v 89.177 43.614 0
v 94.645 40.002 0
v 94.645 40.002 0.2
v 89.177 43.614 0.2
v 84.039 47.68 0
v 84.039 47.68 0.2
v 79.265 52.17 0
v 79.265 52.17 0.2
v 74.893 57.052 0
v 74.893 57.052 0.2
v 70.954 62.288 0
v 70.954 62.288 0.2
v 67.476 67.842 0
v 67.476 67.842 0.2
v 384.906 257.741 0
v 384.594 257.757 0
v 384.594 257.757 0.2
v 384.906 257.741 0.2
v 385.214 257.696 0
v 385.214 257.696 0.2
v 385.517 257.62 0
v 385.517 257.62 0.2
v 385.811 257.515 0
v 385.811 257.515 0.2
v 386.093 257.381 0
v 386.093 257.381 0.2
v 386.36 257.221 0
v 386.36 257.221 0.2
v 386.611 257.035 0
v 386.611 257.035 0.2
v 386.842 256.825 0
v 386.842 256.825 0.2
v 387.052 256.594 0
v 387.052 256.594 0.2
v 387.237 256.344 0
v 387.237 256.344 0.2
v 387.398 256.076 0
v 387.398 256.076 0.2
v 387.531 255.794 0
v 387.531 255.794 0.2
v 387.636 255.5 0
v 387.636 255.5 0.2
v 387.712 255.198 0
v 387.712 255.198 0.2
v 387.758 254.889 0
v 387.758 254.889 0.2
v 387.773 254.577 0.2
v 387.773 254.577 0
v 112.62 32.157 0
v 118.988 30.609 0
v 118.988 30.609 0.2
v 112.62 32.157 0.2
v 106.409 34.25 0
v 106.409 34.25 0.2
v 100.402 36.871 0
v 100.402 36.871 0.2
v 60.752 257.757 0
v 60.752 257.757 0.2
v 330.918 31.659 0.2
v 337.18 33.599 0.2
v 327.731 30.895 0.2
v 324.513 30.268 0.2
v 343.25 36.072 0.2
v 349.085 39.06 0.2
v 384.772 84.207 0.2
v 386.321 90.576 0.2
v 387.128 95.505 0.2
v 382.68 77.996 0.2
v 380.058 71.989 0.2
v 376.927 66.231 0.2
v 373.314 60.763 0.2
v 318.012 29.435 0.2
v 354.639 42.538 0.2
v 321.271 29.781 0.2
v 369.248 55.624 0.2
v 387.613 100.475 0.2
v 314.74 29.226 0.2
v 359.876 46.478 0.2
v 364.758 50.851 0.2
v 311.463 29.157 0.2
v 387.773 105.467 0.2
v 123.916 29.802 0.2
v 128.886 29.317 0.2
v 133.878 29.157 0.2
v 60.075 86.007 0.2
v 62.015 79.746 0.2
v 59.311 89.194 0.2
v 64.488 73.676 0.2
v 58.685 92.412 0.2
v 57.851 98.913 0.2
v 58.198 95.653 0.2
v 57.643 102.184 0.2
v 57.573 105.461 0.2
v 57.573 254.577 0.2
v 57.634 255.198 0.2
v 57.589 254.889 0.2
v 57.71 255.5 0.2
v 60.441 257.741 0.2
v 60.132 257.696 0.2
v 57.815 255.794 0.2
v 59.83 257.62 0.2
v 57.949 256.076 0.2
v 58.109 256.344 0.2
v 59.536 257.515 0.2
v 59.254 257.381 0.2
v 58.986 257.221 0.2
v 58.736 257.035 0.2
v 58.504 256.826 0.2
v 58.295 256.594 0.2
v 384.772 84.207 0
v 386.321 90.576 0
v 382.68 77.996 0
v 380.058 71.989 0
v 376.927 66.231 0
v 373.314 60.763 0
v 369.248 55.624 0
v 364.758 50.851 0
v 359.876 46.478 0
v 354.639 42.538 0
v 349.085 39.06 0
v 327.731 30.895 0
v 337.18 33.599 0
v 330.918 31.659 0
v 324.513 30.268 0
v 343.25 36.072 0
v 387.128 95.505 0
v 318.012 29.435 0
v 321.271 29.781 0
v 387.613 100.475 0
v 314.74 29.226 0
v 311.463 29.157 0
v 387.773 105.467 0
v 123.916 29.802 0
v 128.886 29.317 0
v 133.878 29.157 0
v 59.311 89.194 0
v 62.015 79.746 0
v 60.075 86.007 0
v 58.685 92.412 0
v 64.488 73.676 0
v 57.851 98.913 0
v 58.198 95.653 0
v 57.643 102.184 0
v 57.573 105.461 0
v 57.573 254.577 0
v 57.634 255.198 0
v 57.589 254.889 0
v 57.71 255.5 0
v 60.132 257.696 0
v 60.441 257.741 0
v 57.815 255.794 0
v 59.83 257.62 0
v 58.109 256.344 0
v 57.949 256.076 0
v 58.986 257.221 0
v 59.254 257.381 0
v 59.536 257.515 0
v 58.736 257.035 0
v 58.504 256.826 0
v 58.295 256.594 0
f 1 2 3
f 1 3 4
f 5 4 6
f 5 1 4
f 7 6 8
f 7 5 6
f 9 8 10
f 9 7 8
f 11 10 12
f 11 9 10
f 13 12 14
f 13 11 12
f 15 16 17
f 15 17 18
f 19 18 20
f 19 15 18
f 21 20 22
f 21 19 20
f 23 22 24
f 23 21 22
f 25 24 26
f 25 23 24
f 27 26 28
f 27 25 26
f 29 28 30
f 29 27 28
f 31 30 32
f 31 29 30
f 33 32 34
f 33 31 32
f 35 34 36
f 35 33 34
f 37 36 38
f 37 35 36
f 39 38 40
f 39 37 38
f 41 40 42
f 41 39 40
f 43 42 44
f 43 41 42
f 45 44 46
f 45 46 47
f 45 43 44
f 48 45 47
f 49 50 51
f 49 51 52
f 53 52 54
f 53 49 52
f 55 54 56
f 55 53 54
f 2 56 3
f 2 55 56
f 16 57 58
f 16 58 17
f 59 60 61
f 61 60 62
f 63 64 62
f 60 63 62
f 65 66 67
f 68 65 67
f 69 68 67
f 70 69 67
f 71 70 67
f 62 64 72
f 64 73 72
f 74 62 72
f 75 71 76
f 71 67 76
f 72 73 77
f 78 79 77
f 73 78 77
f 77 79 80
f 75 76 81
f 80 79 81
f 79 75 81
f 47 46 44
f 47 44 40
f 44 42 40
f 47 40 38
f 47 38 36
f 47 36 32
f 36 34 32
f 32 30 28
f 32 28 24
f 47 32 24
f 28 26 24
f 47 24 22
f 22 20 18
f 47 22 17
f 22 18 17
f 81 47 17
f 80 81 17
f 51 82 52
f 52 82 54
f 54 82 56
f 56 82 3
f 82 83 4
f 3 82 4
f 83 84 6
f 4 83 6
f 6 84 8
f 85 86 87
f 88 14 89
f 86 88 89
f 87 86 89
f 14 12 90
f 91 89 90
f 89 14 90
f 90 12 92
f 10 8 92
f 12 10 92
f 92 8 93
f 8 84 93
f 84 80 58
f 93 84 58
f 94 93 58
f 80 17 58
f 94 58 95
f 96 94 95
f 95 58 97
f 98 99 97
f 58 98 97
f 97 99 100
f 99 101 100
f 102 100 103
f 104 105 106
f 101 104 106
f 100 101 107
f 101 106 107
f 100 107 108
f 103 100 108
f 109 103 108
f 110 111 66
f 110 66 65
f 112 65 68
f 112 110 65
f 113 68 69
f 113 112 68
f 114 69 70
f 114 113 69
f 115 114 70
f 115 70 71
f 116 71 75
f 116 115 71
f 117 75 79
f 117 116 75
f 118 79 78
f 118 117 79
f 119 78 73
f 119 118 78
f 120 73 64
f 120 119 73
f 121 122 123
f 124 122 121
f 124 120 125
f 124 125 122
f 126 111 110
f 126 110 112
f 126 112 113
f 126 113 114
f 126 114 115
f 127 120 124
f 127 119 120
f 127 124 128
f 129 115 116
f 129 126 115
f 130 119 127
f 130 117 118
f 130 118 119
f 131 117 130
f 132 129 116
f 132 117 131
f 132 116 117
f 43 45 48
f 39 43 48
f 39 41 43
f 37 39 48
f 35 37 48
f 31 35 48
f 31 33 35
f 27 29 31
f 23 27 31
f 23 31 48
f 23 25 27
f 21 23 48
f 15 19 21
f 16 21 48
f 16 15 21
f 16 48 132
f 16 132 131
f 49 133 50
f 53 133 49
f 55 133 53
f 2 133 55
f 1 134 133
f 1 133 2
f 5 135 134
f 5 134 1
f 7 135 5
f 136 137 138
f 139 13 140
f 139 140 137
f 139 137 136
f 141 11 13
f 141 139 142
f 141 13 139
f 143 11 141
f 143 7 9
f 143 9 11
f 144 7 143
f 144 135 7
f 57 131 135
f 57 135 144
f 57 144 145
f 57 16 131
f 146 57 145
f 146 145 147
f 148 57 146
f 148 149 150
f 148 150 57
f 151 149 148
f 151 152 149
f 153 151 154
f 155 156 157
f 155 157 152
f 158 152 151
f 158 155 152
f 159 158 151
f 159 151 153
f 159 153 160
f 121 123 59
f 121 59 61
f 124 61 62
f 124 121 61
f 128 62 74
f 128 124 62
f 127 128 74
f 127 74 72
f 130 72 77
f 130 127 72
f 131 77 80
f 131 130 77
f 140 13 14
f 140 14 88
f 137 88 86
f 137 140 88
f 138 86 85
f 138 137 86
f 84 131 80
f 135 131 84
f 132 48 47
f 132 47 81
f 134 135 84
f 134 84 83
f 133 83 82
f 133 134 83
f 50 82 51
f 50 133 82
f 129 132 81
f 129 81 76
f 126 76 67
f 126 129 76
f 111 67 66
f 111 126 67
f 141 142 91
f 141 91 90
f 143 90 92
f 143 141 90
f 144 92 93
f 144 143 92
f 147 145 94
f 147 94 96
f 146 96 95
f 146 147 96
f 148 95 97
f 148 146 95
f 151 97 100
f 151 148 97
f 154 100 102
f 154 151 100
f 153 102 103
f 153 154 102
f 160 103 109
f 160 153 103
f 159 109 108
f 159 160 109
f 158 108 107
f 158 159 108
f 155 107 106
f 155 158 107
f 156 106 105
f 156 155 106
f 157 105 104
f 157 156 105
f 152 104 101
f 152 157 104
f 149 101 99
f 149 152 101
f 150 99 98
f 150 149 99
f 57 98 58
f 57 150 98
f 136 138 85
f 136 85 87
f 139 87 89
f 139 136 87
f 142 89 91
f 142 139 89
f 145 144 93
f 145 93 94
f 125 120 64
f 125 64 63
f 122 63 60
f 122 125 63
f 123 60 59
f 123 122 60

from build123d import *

# Parameters (mm, degrees)
BOSS_EXTRUDE1_DEPTH = 0.2


with BuildPart() as part:
    # Model → Boss-Extrude1 (new body)
    with BuildSketch(Plane.XY):
        with BuildLine():
            Line((311.4628, 29.156659), (133.877646, 29.156659))
            ThreePointArc((133.877646, 29.156659), (126.397157508, 29.518924603), (118.987614901, 30.608705684))
            ThreePointArc((118.987614901, 30.608705684), (106.409010734, 34.249903459), (94.644869283, 40.001823133))
            ThreePointArc((94.644869283, 40.001823133), (79.265467697, 52.17043009), (67.475756788, 67.842178719))
            ThreePointArc((67.475756788, 67.842178719), (63.186343849, 76.684502016), (60.075481308, 86.006963006))
            ThreePointArc((60.075481308, 86.006963006), (58.980656761, 90.799830304), (58.197680672, 95.65340282))
            ThreePointArc((58.197680672, 95.65340282), (57.729553743, 100.547315285), (57.573226, 105.46108))
            Line((57.573226, 105.46108), (57.573226, 254.57742))
            ThreePointArc((57.573226, 254.57742), (58.504327705, 256.825551588), (60.752459, 257.756654))
            Line((60.752459, 257.756654), (384.593985, 257.756654))
            ThreePointArc((384.593985, 257.756654), (386.842050539, 256.825485831), (387.773218, 254.57742))
            Line((387.773218, 254.57742), (387.773218, 105.467077))
            ThreePointArc((387.773218, 105.467077), (387.410880841, 97.986010389), (386.32106007, 90.575886467))
            ThreePointArc((386.32106007, 90.575886467), (382.679524191, 77.996258298), (376.927164051, 66.23113266))
            ThreePointArc((376.927164051, 66.23113266), (364.757582557, 50.850607234), (349.084681404, 39.059956465))
            ThreePointArc((349.084681404, 39.059956465), (340.241641266, 34.770275582), (330.918478465, 31.659109186))
            ThreePointArc((330.918478465, 31.659109186), (326.125220503, 30.5642449), (321.271270405, 29.781162436))
            ThreePointArc((321.271270405, 29.781162436), (316.376958763, 29.313050964), (311.4628, 29.156659))
        make_face()
    extrude(amount=BOSS_EXTRUDE1_DEPTH)


solid = part.part
